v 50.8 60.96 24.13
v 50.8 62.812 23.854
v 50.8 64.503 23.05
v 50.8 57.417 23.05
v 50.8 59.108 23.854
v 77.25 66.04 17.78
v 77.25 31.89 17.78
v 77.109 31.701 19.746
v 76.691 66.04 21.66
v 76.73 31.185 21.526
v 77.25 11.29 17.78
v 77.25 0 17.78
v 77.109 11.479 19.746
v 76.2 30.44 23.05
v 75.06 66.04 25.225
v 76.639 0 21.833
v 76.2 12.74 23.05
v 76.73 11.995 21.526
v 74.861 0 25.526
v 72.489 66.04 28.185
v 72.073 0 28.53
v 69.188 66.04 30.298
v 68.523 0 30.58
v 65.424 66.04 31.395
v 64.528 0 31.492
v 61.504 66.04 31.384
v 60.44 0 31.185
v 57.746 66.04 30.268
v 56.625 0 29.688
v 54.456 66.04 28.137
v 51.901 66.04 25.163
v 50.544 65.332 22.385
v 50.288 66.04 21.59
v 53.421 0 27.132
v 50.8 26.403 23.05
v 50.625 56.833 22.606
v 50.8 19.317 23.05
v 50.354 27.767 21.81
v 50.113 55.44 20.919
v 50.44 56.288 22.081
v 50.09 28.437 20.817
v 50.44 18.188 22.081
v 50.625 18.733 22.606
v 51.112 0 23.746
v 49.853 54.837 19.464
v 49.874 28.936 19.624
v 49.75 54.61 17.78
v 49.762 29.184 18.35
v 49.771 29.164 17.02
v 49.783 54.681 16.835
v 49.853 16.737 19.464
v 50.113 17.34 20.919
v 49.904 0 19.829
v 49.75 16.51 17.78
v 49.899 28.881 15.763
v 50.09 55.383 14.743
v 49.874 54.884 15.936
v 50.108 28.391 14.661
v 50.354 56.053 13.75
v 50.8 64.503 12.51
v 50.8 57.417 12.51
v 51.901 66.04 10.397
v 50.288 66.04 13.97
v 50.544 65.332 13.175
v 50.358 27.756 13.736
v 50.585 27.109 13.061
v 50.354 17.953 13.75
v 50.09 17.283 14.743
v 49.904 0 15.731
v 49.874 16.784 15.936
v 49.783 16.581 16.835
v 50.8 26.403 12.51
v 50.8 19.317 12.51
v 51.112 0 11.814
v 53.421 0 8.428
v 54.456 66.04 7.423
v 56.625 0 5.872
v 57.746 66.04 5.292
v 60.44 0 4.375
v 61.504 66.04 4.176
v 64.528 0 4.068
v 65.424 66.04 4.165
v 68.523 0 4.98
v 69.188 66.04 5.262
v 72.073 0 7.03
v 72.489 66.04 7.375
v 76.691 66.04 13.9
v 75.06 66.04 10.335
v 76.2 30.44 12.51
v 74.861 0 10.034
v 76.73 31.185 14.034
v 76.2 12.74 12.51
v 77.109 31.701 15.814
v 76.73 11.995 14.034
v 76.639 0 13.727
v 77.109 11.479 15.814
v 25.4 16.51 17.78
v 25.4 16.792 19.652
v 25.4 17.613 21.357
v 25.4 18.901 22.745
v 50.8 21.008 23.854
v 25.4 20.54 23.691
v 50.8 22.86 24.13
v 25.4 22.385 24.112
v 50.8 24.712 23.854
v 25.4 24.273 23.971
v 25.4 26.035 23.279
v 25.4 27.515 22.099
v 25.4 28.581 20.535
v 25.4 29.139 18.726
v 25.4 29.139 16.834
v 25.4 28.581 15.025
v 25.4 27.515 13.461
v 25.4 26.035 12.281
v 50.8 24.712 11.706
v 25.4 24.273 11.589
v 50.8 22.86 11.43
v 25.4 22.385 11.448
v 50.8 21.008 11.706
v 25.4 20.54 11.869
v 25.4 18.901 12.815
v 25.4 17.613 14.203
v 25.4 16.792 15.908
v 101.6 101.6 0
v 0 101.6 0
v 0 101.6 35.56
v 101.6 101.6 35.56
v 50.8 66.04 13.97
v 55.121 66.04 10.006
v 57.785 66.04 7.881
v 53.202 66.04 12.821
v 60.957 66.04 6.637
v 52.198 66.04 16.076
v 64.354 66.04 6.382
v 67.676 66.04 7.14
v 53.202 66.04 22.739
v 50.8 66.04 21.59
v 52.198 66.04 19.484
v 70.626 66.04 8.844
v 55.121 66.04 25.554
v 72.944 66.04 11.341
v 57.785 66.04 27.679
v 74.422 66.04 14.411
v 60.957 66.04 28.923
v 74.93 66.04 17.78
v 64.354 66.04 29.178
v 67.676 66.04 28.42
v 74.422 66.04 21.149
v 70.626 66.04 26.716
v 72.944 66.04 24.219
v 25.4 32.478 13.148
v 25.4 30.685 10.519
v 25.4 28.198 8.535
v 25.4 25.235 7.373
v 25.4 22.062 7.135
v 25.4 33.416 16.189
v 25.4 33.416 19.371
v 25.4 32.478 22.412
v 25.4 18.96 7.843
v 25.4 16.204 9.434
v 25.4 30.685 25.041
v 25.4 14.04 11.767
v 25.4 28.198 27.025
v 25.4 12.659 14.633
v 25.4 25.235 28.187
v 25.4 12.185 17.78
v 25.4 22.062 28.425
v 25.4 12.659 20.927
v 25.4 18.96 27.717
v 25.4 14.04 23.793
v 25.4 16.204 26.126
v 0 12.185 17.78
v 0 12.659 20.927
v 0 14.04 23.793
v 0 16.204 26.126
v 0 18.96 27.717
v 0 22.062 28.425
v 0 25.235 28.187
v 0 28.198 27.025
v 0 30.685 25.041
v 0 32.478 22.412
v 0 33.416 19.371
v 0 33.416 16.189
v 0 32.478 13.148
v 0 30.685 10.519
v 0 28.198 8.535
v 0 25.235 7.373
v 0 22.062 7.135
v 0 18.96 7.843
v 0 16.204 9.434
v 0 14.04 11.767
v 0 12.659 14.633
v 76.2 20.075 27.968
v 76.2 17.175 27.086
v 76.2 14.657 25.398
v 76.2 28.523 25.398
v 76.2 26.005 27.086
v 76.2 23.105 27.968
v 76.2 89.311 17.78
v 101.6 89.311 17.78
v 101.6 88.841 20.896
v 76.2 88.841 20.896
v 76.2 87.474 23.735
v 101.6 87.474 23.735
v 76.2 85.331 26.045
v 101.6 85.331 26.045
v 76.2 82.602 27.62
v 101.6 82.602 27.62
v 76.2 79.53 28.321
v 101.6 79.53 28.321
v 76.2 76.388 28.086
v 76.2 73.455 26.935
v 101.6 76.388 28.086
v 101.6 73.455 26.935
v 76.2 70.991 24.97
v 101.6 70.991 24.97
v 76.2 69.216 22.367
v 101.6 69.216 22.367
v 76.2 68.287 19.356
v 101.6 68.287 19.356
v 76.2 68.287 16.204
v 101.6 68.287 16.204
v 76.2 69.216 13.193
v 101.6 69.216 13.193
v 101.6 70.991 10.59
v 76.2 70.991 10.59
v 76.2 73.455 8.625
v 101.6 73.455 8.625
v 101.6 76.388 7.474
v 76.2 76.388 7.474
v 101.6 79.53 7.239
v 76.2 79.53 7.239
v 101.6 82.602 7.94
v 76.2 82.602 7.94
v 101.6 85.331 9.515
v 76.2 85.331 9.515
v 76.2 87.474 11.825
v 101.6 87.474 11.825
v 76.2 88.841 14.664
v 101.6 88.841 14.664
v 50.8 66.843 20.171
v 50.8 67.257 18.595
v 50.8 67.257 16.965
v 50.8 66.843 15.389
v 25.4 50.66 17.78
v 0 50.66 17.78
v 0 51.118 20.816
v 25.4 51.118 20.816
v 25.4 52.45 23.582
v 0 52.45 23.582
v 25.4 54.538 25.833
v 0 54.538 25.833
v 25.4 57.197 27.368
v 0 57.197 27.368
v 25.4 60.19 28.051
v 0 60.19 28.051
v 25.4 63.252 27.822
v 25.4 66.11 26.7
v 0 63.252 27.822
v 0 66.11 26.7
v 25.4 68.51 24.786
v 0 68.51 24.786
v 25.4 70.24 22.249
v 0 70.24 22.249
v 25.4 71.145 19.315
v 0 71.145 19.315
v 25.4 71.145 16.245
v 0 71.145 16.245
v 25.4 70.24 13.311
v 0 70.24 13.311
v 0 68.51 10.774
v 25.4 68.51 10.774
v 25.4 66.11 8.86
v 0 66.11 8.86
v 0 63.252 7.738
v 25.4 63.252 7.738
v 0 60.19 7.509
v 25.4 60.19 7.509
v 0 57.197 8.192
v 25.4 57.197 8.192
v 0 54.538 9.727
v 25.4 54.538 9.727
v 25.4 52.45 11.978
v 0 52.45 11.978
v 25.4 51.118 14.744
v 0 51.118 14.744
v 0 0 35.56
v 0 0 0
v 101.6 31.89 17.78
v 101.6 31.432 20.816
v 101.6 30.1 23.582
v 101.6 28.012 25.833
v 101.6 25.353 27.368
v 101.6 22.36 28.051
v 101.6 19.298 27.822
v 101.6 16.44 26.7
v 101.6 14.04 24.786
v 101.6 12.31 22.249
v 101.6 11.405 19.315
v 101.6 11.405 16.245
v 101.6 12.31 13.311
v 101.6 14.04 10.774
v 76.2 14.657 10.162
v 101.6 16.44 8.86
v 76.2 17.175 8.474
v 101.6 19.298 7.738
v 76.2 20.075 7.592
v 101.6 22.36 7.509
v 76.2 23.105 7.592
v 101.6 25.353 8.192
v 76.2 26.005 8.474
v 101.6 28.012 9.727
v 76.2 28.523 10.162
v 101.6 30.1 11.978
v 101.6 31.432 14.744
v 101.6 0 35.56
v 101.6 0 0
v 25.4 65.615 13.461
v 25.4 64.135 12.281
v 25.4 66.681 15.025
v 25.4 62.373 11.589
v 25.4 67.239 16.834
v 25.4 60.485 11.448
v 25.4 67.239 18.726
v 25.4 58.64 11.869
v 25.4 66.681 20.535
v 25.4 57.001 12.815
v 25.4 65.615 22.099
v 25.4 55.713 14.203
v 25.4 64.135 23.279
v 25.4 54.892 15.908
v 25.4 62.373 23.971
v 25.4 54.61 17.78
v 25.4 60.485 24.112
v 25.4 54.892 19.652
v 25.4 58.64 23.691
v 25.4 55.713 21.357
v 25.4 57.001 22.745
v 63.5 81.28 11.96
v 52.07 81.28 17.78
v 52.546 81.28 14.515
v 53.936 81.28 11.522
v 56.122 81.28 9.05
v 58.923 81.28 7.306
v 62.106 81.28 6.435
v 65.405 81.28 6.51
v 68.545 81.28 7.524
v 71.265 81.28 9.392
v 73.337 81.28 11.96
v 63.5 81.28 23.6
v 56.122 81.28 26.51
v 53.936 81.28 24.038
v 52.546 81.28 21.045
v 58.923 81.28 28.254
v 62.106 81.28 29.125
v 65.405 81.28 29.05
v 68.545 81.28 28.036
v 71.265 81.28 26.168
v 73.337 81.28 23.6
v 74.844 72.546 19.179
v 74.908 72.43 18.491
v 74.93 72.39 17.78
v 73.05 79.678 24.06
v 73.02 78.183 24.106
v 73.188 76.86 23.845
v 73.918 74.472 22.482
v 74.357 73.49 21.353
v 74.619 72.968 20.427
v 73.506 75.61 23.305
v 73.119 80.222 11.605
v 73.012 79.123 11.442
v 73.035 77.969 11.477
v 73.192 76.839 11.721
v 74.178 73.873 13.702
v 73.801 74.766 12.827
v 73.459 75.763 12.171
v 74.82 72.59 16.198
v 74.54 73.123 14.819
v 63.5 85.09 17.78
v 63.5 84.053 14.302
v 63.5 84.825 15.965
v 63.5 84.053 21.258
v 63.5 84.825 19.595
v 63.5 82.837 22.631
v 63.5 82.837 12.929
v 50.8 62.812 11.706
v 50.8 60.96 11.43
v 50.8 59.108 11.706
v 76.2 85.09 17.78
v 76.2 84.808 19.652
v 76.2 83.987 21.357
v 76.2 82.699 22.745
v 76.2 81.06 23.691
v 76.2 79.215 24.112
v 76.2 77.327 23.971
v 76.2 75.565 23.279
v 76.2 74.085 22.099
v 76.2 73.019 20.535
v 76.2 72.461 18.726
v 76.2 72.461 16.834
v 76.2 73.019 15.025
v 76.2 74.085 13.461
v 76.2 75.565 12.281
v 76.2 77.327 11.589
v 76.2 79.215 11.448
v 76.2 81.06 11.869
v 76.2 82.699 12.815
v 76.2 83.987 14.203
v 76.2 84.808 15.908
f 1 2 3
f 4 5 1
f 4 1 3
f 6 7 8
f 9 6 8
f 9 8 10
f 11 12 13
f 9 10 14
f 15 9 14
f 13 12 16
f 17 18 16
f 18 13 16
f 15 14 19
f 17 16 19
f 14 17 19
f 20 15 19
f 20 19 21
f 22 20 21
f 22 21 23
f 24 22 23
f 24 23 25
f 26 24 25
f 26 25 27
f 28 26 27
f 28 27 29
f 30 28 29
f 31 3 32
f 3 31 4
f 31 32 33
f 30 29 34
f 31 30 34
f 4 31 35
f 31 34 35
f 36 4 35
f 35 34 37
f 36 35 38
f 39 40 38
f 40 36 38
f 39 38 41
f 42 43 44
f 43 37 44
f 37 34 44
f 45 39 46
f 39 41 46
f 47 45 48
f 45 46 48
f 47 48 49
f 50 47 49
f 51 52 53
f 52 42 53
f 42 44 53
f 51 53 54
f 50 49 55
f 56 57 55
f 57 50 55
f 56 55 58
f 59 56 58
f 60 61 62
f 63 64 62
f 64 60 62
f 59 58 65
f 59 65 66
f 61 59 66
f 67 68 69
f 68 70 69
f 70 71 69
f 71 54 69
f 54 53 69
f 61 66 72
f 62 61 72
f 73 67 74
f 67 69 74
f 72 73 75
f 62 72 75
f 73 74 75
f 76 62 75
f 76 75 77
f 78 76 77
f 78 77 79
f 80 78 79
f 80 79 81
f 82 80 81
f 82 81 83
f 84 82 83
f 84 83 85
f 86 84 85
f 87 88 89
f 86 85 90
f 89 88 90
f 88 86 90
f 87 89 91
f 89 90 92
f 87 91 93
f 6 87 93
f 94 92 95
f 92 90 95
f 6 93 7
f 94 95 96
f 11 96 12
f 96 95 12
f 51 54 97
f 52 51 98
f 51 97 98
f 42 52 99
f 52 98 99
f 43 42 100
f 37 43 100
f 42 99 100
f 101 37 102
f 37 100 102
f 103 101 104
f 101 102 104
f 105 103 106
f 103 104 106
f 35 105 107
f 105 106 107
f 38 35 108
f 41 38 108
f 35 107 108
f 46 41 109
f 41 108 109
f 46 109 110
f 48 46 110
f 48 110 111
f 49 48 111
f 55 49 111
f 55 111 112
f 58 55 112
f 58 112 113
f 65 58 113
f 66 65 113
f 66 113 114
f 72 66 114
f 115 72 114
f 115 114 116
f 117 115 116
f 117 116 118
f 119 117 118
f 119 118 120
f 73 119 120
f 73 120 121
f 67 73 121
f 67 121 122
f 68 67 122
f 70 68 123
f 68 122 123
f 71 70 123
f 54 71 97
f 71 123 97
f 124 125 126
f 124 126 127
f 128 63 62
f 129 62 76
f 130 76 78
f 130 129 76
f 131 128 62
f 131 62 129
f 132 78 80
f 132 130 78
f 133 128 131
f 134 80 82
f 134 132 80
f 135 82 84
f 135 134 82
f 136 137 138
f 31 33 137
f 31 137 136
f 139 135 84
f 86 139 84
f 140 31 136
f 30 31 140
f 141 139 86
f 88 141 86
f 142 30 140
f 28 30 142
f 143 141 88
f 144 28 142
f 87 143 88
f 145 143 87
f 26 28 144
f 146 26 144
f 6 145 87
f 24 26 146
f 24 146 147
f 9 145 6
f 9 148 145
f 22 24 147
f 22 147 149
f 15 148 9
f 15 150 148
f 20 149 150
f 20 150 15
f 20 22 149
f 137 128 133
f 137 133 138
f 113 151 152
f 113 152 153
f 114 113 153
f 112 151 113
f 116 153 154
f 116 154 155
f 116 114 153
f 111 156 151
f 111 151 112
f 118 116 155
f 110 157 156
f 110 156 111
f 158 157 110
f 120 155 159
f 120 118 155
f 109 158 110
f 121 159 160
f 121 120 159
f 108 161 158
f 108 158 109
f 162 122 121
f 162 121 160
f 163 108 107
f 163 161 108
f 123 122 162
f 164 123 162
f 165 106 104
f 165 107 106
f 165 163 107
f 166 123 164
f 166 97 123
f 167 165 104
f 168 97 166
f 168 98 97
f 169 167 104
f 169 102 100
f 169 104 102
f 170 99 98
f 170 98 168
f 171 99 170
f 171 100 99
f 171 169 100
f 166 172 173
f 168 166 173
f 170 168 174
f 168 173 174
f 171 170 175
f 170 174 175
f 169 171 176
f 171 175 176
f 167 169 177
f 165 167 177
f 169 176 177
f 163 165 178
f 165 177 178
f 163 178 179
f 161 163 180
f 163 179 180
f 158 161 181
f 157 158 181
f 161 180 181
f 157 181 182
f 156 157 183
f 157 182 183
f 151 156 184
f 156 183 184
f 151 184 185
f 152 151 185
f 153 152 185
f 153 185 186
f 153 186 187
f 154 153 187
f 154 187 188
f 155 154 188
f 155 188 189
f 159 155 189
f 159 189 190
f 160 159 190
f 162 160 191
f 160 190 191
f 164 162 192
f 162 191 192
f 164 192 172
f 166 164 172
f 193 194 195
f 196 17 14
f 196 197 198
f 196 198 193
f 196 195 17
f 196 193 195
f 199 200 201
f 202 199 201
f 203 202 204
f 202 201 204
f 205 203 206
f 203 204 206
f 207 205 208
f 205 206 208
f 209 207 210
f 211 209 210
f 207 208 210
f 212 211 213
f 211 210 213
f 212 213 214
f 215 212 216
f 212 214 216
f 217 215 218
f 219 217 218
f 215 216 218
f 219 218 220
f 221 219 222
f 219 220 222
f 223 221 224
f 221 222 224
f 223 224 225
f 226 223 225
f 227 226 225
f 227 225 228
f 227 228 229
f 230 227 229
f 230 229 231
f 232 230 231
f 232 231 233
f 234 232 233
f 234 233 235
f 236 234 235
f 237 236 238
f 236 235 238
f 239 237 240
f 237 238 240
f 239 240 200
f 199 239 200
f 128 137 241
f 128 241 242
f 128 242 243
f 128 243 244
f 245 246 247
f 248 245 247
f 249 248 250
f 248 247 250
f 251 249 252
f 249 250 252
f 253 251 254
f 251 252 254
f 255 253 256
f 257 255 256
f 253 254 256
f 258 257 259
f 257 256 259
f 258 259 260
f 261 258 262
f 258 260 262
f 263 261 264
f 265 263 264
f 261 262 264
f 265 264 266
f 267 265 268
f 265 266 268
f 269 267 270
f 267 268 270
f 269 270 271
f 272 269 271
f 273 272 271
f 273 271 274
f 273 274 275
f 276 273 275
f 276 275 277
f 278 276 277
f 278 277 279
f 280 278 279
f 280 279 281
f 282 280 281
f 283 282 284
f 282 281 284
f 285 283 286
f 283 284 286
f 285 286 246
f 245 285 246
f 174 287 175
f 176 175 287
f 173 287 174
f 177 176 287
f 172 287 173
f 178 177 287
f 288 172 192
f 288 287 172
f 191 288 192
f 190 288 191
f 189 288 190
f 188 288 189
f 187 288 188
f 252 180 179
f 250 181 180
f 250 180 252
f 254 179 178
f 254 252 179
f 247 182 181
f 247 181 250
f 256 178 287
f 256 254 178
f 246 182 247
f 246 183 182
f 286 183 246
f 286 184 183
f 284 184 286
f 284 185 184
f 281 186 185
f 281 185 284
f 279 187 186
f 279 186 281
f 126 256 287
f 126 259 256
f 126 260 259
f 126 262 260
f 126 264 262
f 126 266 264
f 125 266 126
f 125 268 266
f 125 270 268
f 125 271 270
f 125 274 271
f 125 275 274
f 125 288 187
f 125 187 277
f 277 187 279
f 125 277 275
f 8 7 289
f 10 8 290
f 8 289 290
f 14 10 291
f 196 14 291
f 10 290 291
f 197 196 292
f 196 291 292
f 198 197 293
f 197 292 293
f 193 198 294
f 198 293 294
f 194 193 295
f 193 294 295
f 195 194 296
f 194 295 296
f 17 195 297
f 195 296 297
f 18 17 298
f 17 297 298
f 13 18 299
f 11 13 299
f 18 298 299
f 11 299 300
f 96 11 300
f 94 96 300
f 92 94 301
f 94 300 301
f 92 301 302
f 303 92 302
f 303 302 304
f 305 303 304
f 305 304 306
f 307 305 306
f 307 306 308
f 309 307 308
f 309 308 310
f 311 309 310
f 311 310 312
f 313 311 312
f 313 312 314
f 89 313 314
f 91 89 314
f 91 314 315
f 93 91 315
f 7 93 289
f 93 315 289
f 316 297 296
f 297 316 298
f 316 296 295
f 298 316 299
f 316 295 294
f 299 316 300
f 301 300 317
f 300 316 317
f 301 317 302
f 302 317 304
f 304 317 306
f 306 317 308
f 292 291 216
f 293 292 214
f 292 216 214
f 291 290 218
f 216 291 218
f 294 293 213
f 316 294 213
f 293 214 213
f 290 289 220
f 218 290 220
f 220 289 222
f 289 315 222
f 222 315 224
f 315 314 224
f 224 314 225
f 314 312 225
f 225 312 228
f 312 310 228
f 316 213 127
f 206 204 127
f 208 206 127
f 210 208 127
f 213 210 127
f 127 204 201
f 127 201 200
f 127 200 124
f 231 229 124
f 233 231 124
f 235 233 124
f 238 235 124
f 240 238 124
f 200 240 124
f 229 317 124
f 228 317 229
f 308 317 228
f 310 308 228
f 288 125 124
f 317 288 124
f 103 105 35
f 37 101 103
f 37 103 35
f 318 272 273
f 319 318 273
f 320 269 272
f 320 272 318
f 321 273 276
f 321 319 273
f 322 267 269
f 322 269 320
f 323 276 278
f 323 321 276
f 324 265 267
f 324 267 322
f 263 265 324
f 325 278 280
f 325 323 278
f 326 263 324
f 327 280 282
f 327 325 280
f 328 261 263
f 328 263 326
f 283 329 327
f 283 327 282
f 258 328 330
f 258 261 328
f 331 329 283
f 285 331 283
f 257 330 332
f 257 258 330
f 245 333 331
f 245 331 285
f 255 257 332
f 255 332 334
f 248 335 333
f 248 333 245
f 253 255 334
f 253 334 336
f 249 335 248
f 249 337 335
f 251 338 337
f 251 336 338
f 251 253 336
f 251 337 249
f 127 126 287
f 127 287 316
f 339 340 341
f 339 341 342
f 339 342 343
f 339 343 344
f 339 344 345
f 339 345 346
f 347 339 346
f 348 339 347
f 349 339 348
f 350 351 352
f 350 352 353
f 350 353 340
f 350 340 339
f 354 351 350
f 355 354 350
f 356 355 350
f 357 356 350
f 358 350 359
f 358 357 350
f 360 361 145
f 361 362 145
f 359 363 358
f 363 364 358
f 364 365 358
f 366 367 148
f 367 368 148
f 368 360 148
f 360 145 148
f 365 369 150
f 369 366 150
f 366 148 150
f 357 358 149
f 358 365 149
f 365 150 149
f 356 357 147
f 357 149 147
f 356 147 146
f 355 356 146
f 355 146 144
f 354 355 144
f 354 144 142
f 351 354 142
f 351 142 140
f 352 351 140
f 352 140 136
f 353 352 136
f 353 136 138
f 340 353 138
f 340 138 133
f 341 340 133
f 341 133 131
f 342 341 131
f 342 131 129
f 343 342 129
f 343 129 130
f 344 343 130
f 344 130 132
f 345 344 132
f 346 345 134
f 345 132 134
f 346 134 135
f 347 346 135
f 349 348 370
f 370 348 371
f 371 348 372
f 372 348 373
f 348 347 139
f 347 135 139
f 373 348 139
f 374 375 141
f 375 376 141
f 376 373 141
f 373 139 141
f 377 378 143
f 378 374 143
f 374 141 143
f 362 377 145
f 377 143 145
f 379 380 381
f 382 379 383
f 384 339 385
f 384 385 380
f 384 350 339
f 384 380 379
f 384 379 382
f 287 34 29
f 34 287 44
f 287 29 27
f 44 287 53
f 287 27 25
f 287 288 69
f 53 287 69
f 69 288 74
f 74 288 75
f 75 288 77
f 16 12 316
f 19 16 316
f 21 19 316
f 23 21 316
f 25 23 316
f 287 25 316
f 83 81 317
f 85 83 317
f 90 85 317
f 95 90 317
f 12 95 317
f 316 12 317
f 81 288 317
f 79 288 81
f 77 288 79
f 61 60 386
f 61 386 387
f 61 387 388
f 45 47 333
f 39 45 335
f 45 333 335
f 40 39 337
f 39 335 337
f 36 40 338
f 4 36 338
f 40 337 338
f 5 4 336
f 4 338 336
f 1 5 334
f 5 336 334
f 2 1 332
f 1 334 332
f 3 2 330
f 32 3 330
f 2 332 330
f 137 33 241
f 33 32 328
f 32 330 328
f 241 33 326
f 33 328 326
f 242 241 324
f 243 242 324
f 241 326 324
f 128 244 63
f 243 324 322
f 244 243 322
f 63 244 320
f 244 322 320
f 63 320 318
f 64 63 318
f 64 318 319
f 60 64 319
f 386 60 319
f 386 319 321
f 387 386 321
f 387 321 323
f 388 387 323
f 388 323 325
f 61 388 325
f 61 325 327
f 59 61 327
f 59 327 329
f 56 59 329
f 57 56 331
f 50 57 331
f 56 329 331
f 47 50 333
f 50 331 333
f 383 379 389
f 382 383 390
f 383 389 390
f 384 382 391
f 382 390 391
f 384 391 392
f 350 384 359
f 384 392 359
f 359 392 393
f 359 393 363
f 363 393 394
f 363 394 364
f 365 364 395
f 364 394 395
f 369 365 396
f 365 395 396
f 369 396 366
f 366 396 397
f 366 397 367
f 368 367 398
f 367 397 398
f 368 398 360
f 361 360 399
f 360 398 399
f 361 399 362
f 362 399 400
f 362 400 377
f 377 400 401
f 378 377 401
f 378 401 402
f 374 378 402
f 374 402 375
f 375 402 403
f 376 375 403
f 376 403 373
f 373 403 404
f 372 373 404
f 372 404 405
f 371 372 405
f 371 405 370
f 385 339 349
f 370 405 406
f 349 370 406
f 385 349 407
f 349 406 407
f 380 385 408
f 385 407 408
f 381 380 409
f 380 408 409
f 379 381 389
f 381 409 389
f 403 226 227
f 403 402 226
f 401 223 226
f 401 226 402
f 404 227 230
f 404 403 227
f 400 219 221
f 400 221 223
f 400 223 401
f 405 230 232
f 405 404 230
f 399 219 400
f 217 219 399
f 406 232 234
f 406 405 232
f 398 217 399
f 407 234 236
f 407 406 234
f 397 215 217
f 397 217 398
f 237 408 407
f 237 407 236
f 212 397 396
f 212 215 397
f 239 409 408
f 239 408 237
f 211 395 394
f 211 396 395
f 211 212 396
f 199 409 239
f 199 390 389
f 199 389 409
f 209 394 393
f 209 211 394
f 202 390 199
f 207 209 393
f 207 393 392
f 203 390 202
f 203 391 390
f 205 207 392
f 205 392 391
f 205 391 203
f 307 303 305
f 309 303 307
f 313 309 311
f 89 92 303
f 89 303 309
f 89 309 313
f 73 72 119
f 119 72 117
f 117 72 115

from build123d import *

# Parameters (mm, degrees)
F0_W      = 101.6
F0_H      = 101.6
F1_DEPTH  = 35.56
F2_R      = 13.75
F2_R_2    = 11.43
F5_DEPTH  = 66.04
F6_DEPTH  = 81.28
F4_R      = 10.3
F4_R_2    = 10.570977
F4_R_3    = 6.35
F7_DEPTH  = 25.4
F3_R      = 6.35
F8_DEPTH  = 50.8
F3_R_2    = 10.3
F3_R_3    = 10.675077
F9_DEPTH  = 25.4
F10_DEPTH = 38.1


with BuildPart() as f1:
    # F0 (on Top) → F1 (new body)
    with BuildSketch(Plane.XY):
        with Locations((50.8, 50.8)):
            Rectangle(F0_W, F0_H)
    extrude(amount=F1_DEPTH)

    # F2 (on face) → F5 (cut)
    with BuildSketch(Plane.XZ):
        with Locations((63.5, 17.78)):
            Circle(F2_R)
        with Locations((63.5, 17.78)):
            Circle(F2_R_2, mode=Mode.SUBTRACT)
        with Locations((63.5, 17.78)):
            Circle(F2_R_2)
    extrude(amount=-F5_DEPTH, mode=Mode.SUBTRACT)

    # F2 (on face) → F6 (cut)
    with BuildSketch(Plane.XZ):
        with Locations((63.5, 17.78)):
            Circle(F2_R_2)
    extrude(amount=-F6_DEPTH, mode=Mode.SUBTRACT)

    # F4 (on face) → F7 (cut)
    with BuildSketch(Plane.YZ.offset(101.6)):
        with Locations((21.59, 17.78)):
            Circle(F4_R)
        with Locations((78.74, 17.78)):
            Circle(F4_R_2)
        with Locations((78.74, 17.78)):
            Circle(F4_R_3, mode=Mode.SUBTRACT)
    extrude(amount=-F7_DEPTH, mode=Mode.SUBTRACT)

    # F3 (on face) → F8 (cut)
    with BuildSketch(Plane(origin=(0, 0, 0), x_dir=(0, -1, 0), z_dir=(-1, 0, 0))):
        with Locations((-60.96, 17.78)):
            Circle(F3_R)
        with Locations((-22.86, 17.78)):
            Circle(F3_R)
    extrude(amount=-F8_DEPTH, mode=Mode.SUBTRACT)

    # F3 (on face) → F9 (cut)
    with BuildSketch(Plane(origin=(0, 0, 0), x_dir=(0, -1, 0), z_dir=(-1, 0, 0))):
        with Locations((-60.96, 17.78)):
            Circle(F3_R_2)
        with Locations((-60.96, 17.78)):
            Circle(F3_R, mode=Mode.SUBTRACT)
        with Locations((-22.86, 17.78)):
            Circle(F3_R_3)
        with Locations((-22.86, 17.78)):
            Circle(F3_R, mode=Mode.SUBTRACT)
    extrude(amount=-F9_DEPTH, mode=Mode.SUBTRACT)

    # F4 (on face) → F10 (cut)
    with BuildSketch(Plane.YZ.offset(101.6)):
        with Locations((78.74, 17.78)):
            Circle(F4_R_3)
    extrude(amount=-F10_DEPTH, mode=Mode.SUBTRACT)


solid = f1.part
